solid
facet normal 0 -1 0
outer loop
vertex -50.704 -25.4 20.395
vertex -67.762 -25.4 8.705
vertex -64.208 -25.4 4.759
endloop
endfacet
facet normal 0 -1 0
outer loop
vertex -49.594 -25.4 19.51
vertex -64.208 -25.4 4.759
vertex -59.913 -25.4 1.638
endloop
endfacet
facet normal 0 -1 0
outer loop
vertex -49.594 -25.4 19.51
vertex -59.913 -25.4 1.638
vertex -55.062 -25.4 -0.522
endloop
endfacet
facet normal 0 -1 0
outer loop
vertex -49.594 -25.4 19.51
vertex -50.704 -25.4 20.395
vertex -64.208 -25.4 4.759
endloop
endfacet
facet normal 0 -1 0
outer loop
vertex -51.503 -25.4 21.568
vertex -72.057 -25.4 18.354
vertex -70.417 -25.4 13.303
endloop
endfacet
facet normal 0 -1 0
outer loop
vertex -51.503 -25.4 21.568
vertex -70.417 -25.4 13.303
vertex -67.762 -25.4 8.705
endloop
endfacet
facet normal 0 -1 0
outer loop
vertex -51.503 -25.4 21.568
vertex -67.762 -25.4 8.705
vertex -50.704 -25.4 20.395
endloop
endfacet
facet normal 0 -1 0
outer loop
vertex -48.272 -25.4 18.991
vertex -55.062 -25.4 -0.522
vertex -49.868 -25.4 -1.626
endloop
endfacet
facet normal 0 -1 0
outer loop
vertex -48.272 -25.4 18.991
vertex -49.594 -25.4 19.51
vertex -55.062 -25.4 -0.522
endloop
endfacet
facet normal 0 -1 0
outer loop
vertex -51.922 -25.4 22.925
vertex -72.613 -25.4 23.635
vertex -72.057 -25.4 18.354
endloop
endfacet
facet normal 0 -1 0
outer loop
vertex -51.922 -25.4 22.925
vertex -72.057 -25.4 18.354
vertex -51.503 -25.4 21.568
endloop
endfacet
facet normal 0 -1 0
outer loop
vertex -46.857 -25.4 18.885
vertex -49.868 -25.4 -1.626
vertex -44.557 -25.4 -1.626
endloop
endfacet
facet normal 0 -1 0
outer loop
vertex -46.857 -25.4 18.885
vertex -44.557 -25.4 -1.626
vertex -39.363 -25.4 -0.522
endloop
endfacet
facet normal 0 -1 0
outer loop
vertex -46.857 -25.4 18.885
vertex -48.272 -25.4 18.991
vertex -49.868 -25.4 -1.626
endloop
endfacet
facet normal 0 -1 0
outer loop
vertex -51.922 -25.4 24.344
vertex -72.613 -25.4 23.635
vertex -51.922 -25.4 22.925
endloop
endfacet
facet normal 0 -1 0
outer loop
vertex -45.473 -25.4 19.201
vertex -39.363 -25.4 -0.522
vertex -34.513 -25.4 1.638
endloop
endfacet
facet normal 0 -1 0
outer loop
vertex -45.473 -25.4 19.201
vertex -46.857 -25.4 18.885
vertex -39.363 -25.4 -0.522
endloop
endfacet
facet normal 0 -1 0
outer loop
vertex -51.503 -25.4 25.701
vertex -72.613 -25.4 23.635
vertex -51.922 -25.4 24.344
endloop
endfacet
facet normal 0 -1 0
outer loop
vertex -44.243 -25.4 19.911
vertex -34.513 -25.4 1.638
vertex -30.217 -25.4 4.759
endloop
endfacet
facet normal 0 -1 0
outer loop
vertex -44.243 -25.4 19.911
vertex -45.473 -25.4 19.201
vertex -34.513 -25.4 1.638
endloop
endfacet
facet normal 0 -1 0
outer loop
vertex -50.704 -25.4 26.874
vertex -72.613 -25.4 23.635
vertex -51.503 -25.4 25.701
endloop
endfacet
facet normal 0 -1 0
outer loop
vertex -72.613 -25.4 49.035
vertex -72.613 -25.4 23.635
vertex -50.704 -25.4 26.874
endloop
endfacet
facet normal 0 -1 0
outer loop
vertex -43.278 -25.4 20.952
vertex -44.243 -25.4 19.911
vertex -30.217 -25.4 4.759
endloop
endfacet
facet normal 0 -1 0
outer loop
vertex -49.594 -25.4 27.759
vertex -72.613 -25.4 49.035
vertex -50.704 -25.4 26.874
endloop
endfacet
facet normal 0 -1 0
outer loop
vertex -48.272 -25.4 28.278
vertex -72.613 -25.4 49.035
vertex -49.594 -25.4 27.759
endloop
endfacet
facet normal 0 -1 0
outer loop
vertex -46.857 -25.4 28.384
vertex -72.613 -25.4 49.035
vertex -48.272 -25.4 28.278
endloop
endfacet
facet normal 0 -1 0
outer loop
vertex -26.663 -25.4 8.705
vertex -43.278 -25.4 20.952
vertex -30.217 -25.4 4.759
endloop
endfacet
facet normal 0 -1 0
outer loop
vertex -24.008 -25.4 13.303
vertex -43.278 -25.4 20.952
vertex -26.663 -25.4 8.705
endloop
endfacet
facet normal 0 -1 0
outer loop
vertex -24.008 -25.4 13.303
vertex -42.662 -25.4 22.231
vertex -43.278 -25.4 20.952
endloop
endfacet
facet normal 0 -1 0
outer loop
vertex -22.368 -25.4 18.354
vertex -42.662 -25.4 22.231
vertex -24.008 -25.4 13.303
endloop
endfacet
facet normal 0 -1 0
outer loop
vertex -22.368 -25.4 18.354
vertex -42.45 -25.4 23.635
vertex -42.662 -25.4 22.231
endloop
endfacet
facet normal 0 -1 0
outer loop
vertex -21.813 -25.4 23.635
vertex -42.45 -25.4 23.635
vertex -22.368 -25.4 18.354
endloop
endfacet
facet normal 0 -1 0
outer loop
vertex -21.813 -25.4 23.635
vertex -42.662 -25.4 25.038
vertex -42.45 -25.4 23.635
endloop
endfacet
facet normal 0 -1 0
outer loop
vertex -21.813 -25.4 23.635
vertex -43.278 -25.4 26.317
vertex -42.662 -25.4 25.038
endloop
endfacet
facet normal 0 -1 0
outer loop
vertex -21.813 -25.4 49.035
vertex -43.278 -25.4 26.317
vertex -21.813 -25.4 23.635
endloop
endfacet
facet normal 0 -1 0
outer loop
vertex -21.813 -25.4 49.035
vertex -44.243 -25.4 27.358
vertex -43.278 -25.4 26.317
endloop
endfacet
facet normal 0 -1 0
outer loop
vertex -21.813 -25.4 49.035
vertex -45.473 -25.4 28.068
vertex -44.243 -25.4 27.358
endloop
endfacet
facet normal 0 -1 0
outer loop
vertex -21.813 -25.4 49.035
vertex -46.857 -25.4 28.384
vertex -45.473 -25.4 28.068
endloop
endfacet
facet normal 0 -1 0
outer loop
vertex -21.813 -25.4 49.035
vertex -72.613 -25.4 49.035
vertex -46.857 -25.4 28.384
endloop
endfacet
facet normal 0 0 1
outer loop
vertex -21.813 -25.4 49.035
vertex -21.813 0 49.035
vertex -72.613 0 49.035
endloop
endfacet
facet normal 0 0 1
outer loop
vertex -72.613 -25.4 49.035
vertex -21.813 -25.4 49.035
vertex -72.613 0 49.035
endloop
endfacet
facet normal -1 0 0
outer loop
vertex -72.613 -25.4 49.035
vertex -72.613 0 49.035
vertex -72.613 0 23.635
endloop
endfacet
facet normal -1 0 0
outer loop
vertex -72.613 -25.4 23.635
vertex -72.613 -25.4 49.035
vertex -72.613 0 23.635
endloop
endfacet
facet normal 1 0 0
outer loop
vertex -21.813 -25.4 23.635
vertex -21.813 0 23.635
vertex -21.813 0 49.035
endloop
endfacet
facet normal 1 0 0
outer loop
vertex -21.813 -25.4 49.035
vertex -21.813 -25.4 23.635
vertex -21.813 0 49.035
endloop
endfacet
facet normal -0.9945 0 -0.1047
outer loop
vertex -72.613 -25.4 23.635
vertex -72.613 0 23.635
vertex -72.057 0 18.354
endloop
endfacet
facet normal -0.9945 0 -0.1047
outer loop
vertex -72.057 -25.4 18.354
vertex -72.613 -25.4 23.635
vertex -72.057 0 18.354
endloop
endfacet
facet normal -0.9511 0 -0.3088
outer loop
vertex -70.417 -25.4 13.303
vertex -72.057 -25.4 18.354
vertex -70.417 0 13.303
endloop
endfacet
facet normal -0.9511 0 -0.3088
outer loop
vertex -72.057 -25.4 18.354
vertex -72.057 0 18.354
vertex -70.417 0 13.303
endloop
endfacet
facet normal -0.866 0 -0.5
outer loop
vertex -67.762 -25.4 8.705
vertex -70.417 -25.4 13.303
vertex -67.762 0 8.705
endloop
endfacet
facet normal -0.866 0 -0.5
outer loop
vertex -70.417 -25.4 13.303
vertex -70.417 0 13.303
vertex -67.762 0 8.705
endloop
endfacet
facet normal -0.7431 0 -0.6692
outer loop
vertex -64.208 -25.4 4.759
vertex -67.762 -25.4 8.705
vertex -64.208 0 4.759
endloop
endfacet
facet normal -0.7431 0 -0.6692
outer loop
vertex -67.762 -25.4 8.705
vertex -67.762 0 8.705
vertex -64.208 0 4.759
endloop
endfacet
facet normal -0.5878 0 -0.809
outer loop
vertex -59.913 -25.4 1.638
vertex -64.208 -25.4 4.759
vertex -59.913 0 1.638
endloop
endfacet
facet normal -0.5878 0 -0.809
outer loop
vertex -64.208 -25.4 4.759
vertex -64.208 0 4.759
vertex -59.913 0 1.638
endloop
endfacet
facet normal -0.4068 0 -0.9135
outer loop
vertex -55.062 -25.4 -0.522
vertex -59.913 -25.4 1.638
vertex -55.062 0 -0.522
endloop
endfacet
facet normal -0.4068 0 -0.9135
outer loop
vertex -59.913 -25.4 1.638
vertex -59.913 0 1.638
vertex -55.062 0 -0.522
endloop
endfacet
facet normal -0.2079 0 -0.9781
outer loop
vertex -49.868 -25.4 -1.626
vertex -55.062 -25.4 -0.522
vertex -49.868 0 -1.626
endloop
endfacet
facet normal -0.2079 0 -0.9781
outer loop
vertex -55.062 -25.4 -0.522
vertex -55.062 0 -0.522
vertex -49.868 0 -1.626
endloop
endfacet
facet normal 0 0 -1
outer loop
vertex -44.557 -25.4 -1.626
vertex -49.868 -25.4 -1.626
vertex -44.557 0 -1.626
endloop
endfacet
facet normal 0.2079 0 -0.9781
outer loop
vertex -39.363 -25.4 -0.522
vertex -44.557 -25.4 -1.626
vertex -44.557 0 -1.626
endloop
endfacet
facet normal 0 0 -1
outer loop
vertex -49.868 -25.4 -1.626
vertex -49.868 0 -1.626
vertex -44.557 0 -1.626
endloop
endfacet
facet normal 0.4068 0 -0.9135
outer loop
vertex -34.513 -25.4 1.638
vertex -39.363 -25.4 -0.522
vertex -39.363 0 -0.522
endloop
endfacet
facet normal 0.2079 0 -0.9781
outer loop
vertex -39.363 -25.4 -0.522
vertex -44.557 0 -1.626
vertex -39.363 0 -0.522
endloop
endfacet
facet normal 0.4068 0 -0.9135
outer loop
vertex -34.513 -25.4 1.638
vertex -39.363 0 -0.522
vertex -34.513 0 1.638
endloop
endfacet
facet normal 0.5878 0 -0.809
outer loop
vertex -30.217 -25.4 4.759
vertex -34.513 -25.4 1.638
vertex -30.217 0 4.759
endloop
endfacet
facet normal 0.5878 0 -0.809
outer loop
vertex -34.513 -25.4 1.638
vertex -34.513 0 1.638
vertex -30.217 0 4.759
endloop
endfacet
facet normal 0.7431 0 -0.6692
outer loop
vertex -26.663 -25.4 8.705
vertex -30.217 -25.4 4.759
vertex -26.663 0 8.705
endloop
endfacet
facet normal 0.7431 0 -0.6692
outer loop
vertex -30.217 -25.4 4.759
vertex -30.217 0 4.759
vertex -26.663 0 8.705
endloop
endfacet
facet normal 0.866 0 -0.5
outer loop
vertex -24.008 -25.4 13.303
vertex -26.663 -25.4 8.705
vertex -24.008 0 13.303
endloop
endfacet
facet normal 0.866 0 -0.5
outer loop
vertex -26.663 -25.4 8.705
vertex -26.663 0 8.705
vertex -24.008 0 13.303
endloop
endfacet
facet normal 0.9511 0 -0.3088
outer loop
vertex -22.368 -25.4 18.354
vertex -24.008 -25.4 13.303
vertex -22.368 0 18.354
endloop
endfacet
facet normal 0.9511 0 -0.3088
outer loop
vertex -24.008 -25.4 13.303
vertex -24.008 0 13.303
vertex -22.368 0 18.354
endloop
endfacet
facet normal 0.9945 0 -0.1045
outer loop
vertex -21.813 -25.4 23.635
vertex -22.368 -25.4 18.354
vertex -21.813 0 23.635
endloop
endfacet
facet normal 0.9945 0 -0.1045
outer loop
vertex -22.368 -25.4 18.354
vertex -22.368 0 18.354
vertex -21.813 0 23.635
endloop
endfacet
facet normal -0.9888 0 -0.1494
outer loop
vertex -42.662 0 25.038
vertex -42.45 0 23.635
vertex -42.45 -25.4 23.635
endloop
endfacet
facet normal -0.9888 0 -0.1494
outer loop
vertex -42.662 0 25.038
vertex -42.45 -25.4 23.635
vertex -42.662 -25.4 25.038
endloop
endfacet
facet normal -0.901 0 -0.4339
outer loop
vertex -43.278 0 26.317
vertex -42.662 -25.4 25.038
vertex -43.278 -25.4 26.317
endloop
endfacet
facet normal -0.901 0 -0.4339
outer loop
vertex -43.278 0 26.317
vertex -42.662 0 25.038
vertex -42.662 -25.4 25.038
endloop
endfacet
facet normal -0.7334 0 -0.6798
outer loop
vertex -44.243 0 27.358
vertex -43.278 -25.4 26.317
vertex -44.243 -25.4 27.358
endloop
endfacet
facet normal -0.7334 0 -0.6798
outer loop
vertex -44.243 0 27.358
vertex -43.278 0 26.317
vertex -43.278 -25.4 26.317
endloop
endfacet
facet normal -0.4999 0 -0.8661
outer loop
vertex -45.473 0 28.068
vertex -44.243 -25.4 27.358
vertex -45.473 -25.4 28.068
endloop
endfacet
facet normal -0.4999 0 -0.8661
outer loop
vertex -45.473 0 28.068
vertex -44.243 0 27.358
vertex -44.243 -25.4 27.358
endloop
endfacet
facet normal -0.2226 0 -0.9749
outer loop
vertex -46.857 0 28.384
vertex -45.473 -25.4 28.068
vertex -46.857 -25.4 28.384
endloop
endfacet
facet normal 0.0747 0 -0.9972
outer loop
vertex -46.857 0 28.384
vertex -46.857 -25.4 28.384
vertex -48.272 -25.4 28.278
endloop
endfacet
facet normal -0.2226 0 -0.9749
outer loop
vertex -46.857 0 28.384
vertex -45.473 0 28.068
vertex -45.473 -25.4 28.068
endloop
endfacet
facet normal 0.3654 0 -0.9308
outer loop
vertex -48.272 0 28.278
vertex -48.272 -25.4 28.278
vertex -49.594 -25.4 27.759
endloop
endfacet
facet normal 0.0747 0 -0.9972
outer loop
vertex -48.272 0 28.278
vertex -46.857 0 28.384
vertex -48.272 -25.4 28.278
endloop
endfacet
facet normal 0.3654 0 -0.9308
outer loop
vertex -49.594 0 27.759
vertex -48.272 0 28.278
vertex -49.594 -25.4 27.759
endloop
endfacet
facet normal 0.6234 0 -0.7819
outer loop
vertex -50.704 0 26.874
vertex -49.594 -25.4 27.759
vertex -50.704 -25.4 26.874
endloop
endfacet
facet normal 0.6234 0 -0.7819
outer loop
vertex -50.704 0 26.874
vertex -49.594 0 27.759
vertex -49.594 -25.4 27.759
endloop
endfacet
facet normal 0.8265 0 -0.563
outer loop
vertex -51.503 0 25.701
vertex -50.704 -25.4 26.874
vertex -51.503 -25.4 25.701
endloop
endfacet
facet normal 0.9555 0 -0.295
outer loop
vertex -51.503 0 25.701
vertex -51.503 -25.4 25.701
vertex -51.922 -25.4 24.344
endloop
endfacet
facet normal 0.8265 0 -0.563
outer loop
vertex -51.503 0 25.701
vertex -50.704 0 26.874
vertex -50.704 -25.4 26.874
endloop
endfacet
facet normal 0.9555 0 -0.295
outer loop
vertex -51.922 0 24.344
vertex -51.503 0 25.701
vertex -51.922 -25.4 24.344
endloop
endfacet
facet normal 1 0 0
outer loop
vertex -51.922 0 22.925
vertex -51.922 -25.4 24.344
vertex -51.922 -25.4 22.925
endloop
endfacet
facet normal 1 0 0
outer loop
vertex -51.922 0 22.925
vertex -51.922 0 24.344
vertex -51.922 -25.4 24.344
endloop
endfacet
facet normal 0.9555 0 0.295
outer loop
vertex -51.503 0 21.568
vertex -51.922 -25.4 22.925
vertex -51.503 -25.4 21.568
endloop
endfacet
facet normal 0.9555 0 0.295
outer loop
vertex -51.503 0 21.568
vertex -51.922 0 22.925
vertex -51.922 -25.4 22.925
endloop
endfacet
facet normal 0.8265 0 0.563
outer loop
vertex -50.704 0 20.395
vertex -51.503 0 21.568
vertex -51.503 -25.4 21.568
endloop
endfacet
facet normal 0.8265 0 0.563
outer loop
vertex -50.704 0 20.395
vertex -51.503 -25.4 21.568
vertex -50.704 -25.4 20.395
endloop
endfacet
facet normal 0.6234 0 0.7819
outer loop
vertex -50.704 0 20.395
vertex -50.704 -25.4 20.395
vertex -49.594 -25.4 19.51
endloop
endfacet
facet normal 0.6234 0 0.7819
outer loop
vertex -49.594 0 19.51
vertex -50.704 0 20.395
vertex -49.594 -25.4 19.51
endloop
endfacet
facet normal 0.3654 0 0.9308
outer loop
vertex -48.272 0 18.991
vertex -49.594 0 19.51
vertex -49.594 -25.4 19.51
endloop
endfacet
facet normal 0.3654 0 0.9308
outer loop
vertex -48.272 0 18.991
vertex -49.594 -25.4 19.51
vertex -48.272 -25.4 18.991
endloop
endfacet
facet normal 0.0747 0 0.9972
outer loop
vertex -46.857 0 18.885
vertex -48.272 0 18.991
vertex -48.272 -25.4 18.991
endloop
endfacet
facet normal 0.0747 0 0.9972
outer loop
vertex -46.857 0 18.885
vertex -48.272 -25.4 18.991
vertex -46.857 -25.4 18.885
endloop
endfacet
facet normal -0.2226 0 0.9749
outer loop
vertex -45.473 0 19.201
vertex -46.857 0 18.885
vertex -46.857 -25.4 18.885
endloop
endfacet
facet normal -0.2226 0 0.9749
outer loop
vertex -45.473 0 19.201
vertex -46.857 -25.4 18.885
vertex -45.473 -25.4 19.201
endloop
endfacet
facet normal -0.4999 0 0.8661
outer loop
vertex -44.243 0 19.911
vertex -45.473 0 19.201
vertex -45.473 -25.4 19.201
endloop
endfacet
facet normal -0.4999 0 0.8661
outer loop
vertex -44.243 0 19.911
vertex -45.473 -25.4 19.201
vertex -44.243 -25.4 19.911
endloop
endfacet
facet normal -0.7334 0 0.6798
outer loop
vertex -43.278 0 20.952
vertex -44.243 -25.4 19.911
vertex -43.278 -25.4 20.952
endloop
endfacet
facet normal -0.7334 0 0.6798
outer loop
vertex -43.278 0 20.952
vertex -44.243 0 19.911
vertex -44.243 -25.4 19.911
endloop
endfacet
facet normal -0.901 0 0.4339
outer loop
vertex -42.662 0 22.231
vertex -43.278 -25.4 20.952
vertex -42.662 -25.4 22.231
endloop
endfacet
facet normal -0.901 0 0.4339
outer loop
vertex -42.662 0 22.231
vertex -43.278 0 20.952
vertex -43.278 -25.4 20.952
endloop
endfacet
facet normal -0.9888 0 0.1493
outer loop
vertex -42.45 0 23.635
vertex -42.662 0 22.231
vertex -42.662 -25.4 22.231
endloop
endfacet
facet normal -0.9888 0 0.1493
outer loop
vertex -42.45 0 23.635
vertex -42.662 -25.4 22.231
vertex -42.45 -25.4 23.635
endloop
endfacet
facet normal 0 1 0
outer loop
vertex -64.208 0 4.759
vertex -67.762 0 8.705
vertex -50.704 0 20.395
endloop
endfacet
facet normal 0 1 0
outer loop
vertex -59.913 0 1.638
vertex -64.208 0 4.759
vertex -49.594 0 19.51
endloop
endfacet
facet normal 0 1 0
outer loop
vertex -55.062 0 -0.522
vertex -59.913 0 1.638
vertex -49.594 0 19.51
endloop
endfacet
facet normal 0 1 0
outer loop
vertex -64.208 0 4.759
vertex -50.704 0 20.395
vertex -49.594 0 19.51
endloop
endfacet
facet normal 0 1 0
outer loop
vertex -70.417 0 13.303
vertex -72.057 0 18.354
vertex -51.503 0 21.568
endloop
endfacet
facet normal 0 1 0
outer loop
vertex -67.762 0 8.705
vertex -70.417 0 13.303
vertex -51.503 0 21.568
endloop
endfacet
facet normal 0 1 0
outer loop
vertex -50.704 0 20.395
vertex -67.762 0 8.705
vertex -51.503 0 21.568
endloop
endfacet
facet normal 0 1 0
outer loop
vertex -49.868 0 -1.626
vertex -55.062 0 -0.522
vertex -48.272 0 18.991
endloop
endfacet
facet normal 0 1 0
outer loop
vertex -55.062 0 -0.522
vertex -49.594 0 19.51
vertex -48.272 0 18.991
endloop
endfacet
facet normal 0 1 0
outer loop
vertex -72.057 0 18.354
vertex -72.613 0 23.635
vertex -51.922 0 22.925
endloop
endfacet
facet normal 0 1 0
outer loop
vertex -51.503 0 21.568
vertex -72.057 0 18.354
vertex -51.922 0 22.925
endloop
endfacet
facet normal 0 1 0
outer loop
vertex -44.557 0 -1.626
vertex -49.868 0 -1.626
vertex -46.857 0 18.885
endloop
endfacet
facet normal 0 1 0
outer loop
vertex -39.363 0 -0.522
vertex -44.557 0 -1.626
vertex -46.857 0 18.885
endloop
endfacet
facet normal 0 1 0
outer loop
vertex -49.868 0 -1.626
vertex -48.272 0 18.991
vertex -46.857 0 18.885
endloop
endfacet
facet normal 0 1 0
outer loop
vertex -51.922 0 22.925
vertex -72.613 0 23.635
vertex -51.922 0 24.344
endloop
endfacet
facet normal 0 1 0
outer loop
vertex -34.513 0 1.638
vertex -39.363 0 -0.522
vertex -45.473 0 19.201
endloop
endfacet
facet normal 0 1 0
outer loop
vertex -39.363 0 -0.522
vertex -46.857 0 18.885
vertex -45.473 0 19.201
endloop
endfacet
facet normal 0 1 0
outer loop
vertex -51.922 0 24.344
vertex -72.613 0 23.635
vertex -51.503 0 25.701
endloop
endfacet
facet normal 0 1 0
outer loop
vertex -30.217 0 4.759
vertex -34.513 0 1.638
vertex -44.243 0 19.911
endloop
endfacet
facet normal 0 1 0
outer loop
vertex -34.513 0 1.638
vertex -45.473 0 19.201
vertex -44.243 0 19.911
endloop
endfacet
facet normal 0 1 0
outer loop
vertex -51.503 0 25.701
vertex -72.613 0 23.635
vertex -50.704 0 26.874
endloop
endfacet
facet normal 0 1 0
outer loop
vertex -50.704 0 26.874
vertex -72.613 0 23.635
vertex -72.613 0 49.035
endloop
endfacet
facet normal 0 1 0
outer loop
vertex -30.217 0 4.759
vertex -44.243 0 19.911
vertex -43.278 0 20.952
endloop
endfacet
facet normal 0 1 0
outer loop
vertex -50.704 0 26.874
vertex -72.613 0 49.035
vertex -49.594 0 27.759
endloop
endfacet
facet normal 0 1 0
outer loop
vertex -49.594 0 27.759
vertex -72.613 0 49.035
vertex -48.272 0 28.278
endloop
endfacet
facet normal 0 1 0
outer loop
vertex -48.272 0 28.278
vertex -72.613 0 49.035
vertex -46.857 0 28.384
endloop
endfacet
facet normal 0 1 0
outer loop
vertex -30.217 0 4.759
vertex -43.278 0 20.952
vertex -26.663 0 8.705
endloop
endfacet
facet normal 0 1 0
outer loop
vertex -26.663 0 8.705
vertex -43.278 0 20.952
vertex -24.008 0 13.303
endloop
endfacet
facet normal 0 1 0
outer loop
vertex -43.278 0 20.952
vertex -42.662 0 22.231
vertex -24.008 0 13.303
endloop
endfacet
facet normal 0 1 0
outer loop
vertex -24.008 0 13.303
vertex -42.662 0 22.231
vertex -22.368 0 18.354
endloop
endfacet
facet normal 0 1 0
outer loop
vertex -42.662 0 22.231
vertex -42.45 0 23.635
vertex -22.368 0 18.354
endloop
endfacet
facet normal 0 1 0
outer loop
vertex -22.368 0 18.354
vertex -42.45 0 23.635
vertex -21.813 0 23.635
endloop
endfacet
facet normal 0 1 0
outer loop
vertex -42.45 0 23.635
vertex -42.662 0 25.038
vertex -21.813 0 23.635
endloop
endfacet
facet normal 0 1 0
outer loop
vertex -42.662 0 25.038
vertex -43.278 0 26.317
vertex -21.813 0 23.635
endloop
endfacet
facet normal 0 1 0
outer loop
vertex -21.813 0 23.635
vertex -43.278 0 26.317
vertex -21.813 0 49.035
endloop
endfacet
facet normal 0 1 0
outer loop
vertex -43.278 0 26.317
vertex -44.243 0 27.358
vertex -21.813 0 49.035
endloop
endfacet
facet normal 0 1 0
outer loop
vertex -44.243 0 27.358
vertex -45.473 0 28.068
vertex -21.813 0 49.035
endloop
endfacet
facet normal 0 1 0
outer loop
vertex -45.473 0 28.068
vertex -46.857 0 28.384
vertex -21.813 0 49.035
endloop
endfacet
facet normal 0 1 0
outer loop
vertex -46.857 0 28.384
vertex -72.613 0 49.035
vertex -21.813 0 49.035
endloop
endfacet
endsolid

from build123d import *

# Parameters (mm, degrees)
F0_R     = 4.7625
F1_DEPTH = 25.4


with BuildPart() as f1:
    # F0 (on Front) → F1 (new body)
    with BuildSketch(Plane.XZ):
        with BuildLine():
            ThreePointArc((-72.612513, 23.634593), (-47.212513, -1.765407), (-21.812513, 23.634593))
            Line((-21.812513, 23.634593), (-21.812513, 49.034593))
            Line((-21.812513, 49.034593), (-72.612513, 49.034593))
            Line((-72.612513, 49.034593), (-72.612513, 23.634593))
        make_face()
        with Locations((-47.212513, 23.634593)):
            Circle(F0_R, mode=Mode.SUBTRACT)
    extrude(amount=F1_DEPTH)


solid = f1.part
